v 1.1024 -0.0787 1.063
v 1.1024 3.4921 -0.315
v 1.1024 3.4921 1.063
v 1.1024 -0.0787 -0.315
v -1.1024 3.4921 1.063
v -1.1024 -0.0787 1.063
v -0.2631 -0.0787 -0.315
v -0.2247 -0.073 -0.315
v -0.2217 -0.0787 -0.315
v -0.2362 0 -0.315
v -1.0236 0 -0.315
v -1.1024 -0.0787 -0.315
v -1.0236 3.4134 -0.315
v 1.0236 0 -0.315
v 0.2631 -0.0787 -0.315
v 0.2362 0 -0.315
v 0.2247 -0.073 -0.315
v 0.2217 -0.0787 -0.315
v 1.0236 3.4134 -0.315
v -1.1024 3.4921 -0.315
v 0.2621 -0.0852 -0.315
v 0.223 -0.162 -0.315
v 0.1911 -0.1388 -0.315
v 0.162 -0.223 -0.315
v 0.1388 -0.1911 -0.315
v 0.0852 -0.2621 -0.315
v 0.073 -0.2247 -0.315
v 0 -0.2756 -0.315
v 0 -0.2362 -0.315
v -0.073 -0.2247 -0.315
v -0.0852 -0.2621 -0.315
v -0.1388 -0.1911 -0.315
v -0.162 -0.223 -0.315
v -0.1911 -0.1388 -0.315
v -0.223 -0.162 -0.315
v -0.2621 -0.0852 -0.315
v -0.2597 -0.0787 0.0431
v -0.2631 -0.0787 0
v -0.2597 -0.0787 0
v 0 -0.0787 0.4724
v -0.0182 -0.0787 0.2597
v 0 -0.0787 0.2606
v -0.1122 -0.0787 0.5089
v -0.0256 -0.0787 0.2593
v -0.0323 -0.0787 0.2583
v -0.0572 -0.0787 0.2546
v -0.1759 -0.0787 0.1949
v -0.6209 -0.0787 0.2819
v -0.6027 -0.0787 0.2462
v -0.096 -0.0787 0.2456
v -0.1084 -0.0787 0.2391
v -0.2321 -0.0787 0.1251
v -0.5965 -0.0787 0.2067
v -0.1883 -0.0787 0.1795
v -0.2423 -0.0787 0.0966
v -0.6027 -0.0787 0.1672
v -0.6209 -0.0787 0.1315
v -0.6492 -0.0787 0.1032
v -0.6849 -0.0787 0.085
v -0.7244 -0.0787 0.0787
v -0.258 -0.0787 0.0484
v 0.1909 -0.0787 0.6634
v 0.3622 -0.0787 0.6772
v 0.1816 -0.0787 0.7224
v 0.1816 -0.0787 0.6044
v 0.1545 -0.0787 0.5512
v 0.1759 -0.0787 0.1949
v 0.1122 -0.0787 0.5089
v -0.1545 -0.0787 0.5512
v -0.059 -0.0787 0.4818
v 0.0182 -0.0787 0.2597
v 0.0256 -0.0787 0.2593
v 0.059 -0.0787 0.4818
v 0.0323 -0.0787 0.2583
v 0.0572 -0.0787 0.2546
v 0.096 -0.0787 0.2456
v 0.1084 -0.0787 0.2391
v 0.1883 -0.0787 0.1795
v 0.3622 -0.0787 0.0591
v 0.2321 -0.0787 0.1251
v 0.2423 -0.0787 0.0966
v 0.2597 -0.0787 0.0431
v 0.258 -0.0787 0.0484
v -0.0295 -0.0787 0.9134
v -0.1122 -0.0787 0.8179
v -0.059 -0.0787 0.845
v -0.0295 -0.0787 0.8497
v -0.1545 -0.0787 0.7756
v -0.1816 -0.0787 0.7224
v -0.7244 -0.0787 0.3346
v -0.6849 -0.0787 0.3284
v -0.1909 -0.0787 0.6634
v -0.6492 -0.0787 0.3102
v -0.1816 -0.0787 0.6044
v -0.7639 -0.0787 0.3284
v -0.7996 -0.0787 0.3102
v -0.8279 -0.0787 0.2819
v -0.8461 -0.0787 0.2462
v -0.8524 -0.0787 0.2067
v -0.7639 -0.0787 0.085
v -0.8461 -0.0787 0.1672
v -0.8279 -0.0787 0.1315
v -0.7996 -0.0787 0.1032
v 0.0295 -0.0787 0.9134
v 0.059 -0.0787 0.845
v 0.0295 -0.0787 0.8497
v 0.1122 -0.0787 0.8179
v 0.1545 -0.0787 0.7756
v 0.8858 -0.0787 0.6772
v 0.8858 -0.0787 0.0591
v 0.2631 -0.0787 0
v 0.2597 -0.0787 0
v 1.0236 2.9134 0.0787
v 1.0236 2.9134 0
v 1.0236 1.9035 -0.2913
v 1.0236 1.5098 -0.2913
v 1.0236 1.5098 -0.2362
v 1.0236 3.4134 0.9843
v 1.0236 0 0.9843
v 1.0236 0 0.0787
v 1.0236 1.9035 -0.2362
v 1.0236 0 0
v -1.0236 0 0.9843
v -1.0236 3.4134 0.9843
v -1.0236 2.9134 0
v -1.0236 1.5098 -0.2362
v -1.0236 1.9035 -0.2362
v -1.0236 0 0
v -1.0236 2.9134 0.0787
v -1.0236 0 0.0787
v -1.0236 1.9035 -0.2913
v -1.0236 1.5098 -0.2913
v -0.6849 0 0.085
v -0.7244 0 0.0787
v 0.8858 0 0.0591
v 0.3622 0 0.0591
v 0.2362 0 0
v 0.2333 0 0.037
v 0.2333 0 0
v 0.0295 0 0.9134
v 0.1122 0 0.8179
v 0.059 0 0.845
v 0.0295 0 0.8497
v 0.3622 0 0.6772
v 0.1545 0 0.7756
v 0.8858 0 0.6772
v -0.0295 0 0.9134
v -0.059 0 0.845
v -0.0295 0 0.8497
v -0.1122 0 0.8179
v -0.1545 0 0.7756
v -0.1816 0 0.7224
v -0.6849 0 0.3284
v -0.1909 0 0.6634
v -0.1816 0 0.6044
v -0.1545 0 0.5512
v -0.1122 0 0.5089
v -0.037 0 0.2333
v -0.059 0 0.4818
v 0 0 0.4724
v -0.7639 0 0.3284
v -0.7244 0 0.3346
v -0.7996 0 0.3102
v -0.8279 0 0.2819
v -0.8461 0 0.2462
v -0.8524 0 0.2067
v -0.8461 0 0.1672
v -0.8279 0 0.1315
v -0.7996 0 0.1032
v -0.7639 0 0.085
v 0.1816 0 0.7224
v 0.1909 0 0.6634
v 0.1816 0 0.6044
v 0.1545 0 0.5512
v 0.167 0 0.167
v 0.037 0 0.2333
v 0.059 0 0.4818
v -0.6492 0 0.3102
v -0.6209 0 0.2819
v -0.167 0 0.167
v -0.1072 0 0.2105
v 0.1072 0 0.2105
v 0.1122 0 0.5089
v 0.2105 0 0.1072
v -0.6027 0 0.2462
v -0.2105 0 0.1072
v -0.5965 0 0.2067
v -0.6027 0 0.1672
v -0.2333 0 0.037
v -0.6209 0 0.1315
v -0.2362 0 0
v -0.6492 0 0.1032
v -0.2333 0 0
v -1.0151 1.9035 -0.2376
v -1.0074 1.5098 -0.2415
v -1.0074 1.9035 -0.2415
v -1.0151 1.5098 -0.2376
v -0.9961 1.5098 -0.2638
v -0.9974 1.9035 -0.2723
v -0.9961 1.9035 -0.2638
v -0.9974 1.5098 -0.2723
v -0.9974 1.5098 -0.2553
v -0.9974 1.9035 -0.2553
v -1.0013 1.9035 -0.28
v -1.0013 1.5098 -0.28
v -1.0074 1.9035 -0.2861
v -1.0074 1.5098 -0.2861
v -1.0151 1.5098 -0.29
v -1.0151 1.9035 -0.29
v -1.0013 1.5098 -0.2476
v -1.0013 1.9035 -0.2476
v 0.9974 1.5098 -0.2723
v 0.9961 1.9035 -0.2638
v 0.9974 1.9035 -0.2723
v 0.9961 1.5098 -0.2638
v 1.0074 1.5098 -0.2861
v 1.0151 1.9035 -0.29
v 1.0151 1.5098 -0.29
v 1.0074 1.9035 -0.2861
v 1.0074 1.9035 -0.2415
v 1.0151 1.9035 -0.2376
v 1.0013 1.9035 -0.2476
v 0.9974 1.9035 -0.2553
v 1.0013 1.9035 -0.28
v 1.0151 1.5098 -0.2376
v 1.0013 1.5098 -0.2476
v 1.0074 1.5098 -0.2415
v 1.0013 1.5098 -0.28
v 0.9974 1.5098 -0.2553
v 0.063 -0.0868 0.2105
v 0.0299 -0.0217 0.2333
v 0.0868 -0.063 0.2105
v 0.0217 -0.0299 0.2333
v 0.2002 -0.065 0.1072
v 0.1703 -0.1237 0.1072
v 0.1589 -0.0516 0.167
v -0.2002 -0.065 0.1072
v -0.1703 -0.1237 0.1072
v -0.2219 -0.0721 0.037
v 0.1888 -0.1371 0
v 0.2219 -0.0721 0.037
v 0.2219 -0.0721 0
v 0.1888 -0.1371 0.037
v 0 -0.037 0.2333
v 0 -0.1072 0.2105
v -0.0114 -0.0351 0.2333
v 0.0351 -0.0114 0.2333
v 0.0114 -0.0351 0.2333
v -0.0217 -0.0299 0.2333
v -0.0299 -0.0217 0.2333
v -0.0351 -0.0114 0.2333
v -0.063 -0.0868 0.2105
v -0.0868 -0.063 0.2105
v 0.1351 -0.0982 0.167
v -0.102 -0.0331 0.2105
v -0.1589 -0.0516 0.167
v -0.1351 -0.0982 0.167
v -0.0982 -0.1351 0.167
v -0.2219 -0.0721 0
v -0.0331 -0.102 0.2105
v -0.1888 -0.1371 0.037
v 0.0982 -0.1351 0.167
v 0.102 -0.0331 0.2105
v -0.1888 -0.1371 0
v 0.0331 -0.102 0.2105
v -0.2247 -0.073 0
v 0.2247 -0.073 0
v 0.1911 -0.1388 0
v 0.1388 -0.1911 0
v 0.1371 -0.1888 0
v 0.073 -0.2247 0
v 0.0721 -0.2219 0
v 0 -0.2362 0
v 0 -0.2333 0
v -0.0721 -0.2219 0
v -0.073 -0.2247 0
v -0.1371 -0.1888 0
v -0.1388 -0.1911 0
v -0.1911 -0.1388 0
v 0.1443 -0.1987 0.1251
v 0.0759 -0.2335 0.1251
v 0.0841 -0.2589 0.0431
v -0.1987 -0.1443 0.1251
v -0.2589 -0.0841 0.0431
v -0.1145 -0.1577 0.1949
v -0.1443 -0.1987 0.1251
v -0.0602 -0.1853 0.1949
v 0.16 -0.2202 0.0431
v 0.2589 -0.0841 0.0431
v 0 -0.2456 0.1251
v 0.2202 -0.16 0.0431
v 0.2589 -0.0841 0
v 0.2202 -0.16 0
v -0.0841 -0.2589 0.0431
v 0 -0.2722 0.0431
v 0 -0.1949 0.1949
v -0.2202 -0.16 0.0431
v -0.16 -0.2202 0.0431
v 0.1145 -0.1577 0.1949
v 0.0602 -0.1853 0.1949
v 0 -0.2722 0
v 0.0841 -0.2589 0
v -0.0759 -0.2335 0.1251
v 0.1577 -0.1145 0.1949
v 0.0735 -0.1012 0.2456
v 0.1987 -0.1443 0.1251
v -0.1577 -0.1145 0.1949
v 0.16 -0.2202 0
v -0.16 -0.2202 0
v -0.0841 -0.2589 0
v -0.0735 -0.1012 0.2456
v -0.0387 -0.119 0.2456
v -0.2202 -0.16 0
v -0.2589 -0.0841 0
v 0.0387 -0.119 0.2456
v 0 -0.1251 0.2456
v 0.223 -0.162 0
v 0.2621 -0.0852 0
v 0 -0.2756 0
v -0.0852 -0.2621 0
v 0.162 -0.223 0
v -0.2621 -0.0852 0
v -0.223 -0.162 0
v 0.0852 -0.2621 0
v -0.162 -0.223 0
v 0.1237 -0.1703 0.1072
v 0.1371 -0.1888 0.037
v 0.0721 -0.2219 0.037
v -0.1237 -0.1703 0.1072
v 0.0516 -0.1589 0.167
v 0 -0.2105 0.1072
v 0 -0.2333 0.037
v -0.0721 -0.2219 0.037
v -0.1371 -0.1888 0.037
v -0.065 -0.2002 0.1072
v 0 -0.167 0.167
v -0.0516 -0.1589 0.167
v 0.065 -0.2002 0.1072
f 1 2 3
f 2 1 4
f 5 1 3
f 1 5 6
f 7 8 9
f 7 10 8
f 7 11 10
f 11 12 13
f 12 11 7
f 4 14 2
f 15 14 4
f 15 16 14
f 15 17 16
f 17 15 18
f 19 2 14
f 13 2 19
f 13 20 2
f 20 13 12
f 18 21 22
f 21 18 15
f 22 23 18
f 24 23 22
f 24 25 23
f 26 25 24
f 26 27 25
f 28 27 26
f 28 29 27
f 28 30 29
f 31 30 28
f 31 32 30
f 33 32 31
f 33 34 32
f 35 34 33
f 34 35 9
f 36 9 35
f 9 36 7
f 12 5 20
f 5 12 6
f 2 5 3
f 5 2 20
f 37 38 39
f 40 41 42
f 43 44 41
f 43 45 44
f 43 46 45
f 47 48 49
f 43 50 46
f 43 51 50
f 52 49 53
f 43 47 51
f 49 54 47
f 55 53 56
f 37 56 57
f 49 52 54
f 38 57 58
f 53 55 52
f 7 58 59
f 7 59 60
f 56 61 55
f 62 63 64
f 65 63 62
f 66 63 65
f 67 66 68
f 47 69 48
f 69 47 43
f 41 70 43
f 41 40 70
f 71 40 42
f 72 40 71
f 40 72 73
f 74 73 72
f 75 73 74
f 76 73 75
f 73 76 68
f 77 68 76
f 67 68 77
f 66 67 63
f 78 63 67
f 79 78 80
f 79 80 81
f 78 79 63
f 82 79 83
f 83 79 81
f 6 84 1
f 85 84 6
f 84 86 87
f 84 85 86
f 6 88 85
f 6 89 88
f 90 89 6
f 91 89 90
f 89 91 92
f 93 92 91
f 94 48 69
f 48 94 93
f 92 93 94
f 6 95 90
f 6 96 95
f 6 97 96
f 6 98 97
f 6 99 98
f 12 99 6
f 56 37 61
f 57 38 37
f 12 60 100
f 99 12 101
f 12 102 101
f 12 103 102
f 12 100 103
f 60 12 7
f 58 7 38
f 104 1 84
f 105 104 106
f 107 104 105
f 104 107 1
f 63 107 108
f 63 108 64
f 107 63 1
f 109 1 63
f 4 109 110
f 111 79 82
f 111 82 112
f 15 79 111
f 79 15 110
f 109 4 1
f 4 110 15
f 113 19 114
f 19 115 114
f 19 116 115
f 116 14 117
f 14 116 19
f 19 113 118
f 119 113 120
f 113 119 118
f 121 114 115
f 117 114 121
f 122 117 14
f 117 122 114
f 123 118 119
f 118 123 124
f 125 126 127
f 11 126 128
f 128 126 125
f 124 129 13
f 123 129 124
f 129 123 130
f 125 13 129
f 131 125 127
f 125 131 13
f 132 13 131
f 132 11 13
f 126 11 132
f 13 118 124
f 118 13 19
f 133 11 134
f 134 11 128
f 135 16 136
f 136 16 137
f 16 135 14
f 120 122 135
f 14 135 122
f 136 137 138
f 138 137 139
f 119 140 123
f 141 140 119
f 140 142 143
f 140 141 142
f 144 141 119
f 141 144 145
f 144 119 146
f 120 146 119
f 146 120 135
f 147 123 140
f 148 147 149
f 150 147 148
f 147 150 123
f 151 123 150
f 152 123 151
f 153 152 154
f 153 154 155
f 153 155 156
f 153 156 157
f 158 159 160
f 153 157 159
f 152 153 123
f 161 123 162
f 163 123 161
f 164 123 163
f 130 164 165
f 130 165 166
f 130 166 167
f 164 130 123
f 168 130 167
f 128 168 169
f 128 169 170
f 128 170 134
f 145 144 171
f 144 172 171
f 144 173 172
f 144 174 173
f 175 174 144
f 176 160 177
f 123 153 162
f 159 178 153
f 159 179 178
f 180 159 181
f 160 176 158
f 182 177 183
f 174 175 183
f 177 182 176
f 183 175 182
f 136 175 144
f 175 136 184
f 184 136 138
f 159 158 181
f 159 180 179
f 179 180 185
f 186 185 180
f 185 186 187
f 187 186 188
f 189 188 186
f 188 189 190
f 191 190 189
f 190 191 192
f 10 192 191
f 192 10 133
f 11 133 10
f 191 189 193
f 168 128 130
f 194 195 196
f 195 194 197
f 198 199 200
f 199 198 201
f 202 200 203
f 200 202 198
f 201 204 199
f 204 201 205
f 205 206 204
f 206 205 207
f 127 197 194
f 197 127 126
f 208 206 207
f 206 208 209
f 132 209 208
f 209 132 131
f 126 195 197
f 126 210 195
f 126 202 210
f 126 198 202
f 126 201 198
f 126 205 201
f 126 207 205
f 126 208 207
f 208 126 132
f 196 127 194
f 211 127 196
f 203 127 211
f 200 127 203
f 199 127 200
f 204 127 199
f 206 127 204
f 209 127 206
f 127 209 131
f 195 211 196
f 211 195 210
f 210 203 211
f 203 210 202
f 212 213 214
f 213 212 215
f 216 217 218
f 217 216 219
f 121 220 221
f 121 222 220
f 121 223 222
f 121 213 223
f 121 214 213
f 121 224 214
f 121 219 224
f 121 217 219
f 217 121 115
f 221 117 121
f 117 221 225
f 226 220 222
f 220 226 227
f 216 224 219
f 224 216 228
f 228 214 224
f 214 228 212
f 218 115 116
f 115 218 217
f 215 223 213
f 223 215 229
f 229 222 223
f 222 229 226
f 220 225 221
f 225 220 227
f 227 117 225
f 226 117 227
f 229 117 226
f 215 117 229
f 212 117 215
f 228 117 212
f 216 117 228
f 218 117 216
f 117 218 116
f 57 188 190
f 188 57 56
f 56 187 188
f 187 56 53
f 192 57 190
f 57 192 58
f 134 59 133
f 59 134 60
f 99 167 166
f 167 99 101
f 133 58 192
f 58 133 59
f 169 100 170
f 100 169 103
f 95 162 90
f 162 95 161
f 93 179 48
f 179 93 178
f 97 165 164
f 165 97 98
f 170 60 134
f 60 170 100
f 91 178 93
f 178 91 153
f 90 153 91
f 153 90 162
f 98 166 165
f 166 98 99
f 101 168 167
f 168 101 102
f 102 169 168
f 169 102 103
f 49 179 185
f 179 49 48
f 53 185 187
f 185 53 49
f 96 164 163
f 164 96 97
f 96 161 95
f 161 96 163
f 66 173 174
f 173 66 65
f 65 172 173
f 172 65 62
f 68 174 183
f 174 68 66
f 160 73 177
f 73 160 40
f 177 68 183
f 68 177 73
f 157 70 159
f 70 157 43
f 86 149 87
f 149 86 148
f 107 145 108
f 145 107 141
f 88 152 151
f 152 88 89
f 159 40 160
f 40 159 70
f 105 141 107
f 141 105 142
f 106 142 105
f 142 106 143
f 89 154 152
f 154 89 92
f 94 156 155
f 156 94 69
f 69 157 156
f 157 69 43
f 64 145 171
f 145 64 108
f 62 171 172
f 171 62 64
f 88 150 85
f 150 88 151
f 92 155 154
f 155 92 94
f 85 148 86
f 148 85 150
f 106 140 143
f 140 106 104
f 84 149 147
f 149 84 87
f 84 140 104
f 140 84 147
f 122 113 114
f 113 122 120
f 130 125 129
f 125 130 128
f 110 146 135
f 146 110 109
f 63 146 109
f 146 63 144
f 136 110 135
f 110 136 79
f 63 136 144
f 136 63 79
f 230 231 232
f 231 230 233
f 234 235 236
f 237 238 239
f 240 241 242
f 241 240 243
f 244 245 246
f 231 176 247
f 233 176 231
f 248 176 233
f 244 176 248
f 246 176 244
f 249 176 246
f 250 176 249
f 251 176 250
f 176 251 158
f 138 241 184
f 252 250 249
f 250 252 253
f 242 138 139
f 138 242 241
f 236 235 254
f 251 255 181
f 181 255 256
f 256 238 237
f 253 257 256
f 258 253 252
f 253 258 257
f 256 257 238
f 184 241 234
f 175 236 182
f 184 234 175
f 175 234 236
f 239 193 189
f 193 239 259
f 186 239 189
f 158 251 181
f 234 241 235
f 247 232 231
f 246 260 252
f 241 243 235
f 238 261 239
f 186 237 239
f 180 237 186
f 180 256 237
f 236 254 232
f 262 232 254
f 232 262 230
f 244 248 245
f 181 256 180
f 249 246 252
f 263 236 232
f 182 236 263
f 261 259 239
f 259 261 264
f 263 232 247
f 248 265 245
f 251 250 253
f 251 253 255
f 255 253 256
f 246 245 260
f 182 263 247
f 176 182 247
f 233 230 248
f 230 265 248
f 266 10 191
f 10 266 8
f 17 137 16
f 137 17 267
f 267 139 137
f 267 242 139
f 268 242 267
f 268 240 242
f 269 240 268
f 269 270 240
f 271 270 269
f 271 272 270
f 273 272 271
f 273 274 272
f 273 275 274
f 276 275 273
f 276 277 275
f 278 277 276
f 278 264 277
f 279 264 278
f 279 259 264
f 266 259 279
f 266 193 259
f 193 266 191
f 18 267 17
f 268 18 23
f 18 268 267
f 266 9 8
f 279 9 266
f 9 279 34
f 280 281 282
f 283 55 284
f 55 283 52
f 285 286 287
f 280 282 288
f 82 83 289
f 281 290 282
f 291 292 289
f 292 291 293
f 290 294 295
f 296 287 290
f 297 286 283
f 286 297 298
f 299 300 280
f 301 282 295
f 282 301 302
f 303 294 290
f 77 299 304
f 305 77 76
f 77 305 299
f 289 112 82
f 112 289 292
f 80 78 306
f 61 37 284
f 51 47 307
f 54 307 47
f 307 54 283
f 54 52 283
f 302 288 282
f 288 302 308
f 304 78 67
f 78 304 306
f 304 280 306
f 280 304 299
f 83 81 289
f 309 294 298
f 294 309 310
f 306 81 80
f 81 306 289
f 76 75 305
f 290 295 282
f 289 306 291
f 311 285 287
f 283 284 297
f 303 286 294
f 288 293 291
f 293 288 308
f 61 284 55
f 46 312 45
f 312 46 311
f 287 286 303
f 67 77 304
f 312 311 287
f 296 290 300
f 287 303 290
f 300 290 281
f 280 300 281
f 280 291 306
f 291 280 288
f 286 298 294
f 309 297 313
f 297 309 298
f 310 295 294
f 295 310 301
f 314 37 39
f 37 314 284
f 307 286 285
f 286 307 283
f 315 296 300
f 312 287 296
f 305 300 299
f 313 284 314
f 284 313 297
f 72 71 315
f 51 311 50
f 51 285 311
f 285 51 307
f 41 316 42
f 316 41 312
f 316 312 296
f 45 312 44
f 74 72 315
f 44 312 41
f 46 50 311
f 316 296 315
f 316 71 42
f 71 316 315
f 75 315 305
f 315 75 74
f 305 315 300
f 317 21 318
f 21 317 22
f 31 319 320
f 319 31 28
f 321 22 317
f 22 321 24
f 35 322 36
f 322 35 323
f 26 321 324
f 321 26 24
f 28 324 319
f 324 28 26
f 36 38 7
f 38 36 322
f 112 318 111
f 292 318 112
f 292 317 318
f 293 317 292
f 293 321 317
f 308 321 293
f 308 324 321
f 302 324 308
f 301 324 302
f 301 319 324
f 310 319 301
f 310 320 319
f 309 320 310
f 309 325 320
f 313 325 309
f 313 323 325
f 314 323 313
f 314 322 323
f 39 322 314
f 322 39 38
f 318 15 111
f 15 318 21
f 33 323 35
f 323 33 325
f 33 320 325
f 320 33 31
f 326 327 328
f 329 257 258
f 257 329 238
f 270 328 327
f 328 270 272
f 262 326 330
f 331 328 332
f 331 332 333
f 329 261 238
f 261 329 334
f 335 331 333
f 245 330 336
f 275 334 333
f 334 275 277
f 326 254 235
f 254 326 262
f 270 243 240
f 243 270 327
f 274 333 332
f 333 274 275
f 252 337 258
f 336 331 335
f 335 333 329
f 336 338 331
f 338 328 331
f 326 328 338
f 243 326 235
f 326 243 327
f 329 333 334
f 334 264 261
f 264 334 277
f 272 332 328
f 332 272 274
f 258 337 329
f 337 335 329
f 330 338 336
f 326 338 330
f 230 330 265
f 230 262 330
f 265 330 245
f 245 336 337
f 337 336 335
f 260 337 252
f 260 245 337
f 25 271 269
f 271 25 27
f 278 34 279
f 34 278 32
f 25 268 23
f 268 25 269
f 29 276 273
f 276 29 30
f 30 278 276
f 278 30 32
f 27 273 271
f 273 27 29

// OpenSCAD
BOARD_WIDTH	=5.2;
BOARD_LENGTH	=7.4;
BOARD_THICK	=0.2;
BOARD_HEIGHT	=2.3;
BOARD_BELOW	=0.3;

additional_length=2.54*0.5;

CORNER_HOLE_INSET=0.5;
HOLE_DIAMETER	=0.3;

jack_width		=1.23;
jack_height		=1.47;
jack_inset		=0.4;
jack_depth		=1.3;
jack_stickout	=0.31;
jack_slack		=0.05;

power_inner_diameter=0.37;
power_outer_diameter=0.65;
power_jack_width=1.16;
power_jack_inset=0.18;
power_jack_center_inset=power_jack_inset + power_jack_width/2.0;
power_jack_stickout = 0.3;

button_hole_diameter=0.97;
button_height=1.2+button_hole_diameter/2.0;

BOX_WALL=0.2;
BOX_FLOOR=0.3;
TOP_OVERHANG=0.2;

snap_height=0.07;//TOP_OVERHANG/2.0;

hole_positions_in_inches = [[0.15,2.7,0.0],
[1.85,2.7,0.0],
[1.85,0.55,0.0],
[1.15, 0.25,0.0],
[0.75, 0.25,0.0]];

in_to_cm=2.54;

$fn=20;

module board_blank(){

	translate([-BOARD_WIDTH/2.0, 0.0, 0.0])
	union(){
		cube(size=[BOARD_WIDTH,BOARD_LENGTH,BOARD_THICK]);
	
		translate([power_jack_center_inset, -power_jack_stickout, BOARD_THICK + power_outer_diameter/2.0]){
			rotate([-90.0,0.0,0.0]) cylinder(d=power_outer_diameter);
			translate([0.0,1.02, 0.0]) cube([1.2,1.4,power_outer_diameter],center=true);
		}

		translate([BOARD_WIDTH-(jack_width+jack_inset)-jack_slack,-jack_stickout, BOARD_THICK-jack_slack])
			cube(size=[jack_width+jack_slack*2.0, jack_depth, jack_height+jack_slack*2.0]);

		//Hole for BUTTON
		translate([BOARD_WIDTH/2.0, -1.5, button_height])
		rotate([-90.0, 0.0, 0.0]){
			cylinder(d=button_hole_diameter, h=3);
			//Notch
			translate([0,-button_hole_diameter/2.0,1.5])
				cube(size=[0.15,0.3,3],center=true);
		}
	}

}

module top_box(){
	overhang_for_difference = 0.5;
	difference(){
		//OUTSIDE BOX
		translate([-BOARD_WIDTH/2.0 - BOX_WALL, -BOX_WALL, -BOX_FLOOR - BOARD_BELOW - TOP_OVERHANG])
			cube(size=[BOARD_WIDTH+2.0*BOX_WALL, BOARD_LENGTH +2.0*BOX_WALL+additional_length, BOARD_THICK+BOARD_HEIGHT+BOARD_BELOW + BOX_WALL + BOX_FLOOR + TOP_OVERHANG]);
		//VOID inside BOX
		translate([-BOARD_WIDTH/2.0, 0.0, -BOARD_BELOW-BOX_FLOOR-overhang_for_difference - TOP_OVERHANG])
			cube(size=[BOARD_WIDTH, BOARD_LENGTH+additional_length, BOARD_THICK+BOARD_HEIGHT+BOARD_BELOW+BOX_FLOOR+overhang_for_difference+ TOP_OVERHANG]);
	}

	//SNAPS
	for(i = [-1, 1]){
	translate([i*BOARD_WIDTH/2.0, (BOARD_LENGTH+additional_length)/2.0, -BOARD_BELOW - BOX_FLOOR - snap_height])
		rotate([-90.0,0.0,0.0]) cylinder(d=snap_height*2.0,h=1.0, center=true);
	}
}


module bottom_plate_hole_support(x,y,d,h){
	d2 = d+0.2;
	translate([x,y,0.0]){
		union(){
			cylinder(d=d, h=BOARD_BELOW+h);
			translate([-0.05, -0.3, 0.0]) cube(size=[0.1, 0.6, BOARD_BELOW]);
		}
	}
}

module bottom_plate(){
	plate_length = BOARD_LENGTH + additional_length;

	translate([0.0, 0.0, -BOARD_BELOW]){
		//The pegs
		translate([-BOARD_WIDTH/2.0,0,0])
		for(i=[0:len(hole_positions_in_inches)-1]){
			bottom_plate_hole_support(in_to_cm*hole_positions_in_inches[i][0], in_to_cm*hole_positions_in_inches[i][1], d=HOLE_DIAMETER, h=0.3);
		}
		//Special support peg that does not go through.
		bottom_plate_hole_support(0.0, BOARD_LENGTH/2.0, d=HOLE_DIAMETER, h=0.0);

	//The bottom plate itself.
		translate([-BOARD_WIDTH/2.0, 0.0, -BOX_FLOOR]){
			cube([BOARD_WIDTH, plate_length, BOX_FLOOR]);
			//The feet
			difference(){
				for(z = [-1, 1]){
					translate([BOARD_WIDTH/2.0 , plate_length/2.0, BOX_FLOOR/2.0])
						rotate([0.0, z*30, 0.0])
							translate([z*1.5/2.0, 0.0, 0.0])
							cube([1.5, plate_length, BOX_FLOOR],center=true);
				}
				for(z = [1.0, BOARD_LENGTH-2.0])
				translate([0.0, z, -BOX_FLOOR/2.0 - 0.06]) cube([10,1,0.2]);
			}
		}
	}
}


	
module full_top_box(){
	//TOP BOX STUFF
	color("blue")
	union(){
	difference(){
		top_box();
		board_blank();
		union(){
			sphere(d=1.2);
			translate([0,0,-10]) cylinder(d=1.2, h=10);
		}
	}
	difference(){
		union(){
			sphere(d=1.2+BOX_WALL);
			translate([0,0,-BOARD_BELOW-BOX_FLOOR-TOP_OVERHANG]) cylinder(d=1.2+BOX_WALL, h=BOARD_BELOW+BOX_FLOOR+TOP_OVERHANG);
		}
		union(){
			translate([-10,0,-10]) cube(size=[20,20,20]);
			translate([0,0,-10-BOARD_BELOW-BOX_FLOOR-TOP_OVERHANG]) cube(size=[20,20,20],center=true);
			sphere(d=1.2);
			translate([0,0,-10]) cylinder(d=1.2, h=10);
		}
	}
	}
}

//MAIN
	scale(1/2.54){
	full_top_box();
	% board_blank();
	//bottom_plate();
	//TUBE
	% translate([0,0,-2.1]) rotate([-90,0,0]) cylinder(d=2.54,h=9);
}
